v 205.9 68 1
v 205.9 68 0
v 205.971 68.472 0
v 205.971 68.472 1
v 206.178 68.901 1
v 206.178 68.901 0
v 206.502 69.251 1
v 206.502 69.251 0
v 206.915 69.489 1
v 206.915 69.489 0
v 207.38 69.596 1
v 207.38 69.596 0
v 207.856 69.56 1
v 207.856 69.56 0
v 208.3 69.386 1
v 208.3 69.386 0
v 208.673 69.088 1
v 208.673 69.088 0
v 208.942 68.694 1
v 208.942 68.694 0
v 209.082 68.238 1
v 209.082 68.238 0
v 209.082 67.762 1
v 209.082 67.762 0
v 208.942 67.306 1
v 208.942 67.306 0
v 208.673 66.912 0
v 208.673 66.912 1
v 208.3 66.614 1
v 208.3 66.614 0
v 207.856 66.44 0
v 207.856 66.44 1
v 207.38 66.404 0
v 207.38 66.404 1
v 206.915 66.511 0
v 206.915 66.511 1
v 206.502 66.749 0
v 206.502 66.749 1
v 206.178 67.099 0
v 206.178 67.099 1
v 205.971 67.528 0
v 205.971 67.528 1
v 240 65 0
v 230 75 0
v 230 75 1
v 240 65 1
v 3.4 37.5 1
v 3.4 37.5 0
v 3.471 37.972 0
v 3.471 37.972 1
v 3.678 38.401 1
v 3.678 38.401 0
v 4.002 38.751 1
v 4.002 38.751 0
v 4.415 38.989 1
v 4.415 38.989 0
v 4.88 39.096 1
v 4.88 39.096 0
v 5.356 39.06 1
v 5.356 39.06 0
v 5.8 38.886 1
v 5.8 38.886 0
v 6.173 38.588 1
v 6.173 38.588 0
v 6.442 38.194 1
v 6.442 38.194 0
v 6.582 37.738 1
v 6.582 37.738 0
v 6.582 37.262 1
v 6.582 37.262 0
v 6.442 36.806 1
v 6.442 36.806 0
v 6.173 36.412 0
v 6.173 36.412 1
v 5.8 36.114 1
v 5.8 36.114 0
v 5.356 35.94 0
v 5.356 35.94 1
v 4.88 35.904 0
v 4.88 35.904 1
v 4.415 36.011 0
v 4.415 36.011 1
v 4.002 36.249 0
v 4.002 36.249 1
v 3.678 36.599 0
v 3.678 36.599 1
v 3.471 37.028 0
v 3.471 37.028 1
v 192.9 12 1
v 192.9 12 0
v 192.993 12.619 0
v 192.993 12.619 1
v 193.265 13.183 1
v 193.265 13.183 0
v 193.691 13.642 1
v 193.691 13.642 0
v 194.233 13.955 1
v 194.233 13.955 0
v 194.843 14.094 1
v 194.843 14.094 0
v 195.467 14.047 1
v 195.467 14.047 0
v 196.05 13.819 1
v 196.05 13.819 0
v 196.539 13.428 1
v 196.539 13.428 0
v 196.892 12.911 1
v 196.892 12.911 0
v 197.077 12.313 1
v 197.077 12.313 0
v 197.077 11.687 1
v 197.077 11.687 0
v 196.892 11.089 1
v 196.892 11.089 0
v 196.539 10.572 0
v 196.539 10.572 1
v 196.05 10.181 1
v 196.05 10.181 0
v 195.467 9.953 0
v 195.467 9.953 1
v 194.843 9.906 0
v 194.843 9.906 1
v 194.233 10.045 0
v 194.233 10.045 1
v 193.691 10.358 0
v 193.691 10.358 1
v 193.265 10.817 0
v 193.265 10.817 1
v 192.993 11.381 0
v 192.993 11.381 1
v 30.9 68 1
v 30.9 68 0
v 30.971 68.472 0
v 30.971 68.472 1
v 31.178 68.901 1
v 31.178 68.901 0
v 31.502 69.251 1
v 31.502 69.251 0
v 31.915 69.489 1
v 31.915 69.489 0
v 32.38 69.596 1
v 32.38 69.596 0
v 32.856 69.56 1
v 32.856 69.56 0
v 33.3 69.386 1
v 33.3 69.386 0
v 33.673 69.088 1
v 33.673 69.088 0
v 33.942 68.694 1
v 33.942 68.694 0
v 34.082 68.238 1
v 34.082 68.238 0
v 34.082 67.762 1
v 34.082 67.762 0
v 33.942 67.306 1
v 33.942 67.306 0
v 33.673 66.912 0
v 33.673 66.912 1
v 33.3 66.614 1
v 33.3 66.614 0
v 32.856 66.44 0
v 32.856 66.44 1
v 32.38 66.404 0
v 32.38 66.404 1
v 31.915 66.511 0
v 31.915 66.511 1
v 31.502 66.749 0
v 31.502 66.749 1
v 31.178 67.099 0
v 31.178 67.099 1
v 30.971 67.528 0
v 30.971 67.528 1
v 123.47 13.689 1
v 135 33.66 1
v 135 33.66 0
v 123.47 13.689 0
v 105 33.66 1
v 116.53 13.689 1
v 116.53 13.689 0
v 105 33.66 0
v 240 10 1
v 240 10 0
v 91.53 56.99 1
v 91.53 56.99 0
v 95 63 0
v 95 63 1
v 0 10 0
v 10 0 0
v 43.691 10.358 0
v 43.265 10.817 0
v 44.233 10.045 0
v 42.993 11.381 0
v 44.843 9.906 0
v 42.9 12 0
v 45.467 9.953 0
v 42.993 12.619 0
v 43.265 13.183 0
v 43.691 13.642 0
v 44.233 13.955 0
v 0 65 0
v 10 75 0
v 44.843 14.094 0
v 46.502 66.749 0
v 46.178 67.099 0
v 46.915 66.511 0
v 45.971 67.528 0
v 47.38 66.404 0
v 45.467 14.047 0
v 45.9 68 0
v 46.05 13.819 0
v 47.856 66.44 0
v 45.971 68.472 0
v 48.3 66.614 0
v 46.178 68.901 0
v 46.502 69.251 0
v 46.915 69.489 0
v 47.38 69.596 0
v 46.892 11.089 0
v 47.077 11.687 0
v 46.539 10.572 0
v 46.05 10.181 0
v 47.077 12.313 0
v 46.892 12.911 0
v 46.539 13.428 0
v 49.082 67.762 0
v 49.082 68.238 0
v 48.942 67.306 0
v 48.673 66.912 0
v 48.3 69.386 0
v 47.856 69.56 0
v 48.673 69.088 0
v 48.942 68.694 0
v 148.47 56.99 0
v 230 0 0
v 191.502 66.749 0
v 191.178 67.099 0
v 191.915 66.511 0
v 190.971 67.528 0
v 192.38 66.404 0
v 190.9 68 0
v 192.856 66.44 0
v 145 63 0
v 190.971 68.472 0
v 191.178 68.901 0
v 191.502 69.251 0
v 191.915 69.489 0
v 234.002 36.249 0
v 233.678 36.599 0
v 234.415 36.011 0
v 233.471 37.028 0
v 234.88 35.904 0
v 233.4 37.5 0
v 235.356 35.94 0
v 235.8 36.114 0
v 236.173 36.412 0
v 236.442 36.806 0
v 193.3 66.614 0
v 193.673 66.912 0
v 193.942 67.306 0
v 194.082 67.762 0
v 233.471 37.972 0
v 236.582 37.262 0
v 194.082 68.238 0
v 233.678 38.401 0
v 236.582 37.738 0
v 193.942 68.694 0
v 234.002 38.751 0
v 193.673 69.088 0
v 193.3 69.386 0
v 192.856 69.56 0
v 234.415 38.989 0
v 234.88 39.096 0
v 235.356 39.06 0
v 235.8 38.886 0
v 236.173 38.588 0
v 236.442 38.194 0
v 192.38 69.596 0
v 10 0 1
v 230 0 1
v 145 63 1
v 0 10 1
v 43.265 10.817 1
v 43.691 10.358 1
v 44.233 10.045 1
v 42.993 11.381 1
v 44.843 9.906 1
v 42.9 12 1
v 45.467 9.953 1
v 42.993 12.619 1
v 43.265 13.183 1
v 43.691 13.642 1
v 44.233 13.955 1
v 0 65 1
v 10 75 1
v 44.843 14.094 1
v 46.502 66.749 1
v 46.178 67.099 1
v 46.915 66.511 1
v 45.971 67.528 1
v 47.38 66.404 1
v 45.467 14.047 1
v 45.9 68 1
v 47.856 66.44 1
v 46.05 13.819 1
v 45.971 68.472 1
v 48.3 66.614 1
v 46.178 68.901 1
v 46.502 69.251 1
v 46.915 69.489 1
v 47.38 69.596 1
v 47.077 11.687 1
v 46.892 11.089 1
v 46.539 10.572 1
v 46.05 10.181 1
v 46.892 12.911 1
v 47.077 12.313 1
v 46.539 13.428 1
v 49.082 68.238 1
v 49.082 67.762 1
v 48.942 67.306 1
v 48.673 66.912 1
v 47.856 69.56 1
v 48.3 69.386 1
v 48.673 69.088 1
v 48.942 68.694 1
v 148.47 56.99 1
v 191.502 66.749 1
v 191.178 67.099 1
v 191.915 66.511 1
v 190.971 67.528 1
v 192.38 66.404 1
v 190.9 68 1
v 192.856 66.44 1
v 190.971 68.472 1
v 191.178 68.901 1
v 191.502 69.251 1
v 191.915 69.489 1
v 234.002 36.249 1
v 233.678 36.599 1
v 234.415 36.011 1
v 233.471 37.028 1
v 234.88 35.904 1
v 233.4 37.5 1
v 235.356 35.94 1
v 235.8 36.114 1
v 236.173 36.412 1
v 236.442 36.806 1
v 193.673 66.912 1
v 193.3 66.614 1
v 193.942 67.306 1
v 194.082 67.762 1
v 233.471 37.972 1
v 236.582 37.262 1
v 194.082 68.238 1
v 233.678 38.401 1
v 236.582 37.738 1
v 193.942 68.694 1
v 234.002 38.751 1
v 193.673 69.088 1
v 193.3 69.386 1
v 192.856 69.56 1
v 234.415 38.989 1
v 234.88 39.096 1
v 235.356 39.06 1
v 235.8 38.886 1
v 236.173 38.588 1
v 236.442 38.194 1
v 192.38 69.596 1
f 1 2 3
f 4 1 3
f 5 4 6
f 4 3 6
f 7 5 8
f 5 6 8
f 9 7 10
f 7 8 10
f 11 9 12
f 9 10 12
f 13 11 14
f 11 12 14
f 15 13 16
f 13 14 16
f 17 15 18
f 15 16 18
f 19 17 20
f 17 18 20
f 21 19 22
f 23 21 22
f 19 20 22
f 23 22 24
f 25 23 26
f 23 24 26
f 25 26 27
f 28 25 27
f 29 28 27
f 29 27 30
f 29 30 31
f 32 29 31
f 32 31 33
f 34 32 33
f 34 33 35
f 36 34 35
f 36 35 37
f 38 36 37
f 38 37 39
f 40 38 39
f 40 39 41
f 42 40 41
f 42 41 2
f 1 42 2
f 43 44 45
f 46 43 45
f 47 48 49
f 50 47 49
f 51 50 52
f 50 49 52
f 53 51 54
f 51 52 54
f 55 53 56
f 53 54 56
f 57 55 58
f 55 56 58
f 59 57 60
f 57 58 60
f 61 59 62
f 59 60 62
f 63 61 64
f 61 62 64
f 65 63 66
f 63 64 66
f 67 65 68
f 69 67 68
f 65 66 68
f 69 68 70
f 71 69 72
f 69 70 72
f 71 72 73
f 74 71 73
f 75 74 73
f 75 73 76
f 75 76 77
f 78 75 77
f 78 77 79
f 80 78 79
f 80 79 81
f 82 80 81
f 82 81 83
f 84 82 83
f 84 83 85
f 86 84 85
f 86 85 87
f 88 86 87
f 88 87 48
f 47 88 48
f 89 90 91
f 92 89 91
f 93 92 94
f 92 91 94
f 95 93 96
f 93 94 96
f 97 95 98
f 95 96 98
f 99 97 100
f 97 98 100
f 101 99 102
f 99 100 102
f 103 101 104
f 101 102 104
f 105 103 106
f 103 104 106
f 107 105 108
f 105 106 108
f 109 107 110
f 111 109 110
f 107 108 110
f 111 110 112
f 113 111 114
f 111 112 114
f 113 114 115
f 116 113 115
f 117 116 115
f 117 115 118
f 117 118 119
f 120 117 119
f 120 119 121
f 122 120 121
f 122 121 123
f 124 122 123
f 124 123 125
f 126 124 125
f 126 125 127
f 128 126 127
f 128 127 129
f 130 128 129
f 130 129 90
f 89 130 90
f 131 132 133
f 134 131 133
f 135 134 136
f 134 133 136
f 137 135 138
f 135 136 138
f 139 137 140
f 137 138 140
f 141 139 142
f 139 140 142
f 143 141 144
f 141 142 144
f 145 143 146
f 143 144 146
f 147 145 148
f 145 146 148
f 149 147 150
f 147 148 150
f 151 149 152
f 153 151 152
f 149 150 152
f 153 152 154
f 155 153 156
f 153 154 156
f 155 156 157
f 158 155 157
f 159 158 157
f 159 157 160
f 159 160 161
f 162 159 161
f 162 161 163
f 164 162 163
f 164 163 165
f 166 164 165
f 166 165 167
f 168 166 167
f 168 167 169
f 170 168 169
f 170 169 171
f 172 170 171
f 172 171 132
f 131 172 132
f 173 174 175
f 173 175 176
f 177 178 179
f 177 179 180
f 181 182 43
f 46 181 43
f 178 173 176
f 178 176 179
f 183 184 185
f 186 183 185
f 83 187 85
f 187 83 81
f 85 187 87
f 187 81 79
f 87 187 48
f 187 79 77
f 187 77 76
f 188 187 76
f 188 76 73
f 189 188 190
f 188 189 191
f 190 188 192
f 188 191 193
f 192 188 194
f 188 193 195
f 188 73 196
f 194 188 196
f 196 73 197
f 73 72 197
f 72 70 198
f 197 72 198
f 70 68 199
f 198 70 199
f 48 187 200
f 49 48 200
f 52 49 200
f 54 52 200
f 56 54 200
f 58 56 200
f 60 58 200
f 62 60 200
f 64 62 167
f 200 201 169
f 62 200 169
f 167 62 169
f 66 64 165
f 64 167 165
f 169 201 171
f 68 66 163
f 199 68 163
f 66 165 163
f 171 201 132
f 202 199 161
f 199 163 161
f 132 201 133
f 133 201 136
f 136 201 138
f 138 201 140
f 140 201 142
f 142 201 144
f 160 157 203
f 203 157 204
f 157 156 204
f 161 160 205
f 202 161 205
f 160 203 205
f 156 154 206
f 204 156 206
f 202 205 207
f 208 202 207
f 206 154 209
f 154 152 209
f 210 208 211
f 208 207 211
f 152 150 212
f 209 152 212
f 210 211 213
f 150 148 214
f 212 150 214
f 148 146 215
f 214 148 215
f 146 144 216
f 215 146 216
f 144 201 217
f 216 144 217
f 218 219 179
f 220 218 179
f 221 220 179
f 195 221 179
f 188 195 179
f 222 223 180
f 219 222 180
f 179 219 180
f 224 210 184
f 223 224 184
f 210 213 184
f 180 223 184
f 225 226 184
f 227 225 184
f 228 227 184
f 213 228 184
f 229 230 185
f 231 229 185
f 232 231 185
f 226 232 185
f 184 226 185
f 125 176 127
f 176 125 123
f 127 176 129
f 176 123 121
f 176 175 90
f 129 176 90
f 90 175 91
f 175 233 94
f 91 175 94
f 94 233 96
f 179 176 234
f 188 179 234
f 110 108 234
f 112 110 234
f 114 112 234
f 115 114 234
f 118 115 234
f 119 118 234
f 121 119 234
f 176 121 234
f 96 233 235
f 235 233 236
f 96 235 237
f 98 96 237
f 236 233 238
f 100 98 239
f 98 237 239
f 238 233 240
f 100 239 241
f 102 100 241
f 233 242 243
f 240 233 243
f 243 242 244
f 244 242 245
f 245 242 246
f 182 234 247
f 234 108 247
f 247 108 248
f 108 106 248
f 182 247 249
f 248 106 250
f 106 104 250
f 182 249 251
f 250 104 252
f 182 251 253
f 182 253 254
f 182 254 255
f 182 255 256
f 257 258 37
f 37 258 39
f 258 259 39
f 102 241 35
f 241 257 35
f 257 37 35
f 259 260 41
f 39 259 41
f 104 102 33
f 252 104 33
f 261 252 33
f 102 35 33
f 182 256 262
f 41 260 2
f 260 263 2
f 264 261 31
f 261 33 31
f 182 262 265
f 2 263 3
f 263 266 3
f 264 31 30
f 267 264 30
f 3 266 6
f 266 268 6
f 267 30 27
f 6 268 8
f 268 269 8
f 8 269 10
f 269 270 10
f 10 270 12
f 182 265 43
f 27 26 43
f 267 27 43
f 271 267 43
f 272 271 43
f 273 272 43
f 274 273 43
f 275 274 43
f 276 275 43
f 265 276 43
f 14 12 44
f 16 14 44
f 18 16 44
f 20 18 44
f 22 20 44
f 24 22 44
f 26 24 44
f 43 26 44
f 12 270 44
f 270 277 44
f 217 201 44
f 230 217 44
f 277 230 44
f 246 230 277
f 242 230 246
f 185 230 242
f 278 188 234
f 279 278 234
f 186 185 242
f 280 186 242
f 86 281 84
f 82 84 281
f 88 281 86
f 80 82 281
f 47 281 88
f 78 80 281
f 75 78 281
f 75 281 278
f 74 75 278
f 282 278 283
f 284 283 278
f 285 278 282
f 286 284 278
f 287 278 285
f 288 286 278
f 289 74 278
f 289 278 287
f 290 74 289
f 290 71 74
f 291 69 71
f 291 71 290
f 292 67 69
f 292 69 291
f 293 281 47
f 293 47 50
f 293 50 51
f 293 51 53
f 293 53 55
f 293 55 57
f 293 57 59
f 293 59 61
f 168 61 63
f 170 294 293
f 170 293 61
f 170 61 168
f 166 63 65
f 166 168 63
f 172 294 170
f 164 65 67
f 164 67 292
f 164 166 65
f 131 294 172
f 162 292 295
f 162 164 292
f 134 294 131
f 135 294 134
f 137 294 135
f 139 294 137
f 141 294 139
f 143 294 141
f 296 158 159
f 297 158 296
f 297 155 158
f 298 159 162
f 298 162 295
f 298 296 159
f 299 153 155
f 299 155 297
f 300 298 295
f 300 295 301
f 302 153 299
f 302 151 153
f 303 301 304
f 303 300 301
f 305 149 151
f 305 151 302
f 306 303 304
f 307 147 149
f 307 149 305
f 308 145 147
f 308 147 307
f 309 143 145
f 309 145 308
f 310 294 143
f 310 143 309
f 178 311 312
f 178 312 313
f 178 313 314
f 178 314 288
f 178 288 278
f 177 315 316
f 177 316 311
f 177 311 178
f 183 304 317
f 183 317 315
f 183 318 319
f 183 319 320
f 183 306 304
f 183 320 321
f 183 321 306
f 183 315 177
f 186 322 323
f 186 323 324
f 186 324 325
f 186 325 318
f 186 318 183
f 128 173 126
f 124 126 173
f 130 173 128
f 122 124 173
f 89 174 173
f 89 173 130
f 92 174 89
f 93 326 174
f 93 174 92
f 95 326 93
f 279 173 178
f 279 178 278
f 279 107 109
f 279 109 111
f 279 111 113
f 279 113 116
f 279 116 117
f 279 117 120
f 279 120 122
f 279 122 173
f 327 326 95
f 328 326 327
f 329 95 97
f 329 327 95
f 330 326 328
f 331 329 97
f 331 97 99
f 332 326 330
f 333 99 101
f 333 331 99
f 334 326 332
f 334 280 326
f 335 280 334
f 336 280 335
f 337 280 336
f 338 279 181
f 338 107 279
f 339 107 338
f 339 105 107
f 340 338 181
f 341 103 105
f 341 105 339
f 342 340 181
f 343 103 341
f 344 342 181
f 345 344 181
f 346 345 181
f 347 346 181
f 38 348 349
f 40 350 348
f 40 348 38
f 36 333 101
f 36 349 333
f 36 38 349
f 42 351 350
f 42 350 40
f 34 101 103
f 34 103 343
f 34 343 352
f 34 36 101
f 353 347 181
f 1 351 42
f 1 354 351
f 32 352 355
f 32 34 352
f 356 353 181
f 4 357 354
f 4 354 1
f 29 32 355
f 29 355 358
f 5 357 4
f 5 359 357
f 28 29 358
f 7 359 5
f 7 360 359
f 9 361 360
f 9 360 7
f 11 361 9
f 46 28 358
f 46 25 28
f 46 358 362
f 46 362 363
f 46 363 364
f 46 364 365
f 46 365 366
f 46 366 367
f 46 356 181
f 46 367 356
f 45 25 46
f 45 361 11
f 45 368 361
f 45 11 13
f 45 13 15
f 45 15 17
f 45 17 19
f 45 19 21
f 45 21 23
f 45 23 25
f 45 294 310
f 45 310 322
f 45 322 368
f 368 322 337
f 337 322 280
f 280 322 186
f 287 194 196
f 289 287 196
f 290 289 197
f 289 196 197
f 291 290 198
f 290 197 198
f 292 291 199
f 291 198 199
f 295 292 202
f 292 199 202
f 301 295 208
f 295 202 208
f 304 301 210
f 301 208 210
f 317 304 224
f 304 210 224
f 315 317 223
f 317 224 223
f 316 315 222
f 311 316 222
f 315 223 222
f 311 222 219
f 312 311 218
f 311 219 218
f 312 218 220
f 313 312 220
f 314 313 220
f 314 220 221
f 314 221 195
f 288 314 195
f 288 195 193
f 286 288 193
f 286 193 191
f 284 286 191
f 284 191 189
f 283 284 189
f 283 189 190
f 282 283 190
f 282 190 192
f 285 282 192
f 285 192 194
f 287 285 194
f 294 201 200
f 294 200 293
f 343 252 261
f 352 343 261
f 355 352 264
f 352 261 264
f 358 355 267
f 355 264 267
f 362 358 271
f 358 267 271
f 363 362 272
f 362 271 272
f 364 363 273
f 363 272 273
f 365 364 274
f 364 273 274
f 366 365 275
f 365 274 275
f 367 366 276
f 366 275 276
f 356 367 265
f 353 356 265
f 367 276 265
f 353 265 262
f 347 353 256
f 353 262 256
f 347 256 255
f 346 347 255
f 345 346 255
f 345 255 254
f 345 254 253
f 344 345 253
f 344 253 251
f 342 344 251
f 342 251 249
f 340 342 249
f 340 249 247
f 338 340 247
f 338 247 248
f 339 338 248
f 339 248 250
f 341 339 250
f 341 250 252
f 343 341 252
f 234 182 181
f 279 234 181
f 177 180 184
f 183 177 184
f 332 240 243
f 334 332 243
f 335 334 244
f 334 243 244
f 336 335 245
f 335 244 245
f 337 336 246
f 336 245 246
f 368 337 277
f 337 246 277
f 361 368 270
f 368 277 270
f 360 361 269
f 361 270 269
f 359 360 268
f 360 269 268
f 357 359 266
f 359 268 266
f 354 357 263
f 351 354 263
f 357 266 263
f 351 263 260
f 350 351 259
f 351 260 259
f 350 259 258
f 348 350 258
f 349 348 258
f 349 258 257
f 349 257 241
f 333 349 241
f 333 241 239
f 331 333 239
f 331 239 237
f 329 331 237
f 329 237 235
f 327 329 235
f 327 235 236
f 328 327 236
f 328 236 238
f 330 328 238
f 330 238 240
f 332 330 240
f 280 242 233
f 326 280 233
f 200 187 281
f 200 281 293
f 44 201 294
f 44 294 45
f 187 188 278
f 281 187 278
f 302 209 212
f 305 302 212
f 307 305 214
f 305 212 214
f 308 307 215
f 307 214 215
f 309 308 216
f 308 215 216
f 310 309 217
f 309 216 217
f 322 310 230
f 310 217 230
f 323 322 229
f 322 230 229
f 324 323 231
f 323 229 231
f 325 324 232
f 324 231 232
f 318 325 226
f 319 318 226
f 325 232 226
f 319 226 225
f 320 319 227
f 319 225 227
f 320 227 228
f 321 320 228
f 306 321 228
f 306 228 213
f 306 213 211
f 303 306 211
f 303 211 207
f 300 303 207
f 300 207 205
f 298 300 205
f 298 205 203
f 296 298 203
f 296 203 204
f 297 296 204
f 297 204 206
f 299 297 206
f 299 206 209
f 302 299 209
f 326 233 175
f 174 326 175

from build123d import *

# Parameters (mm, degrees)
SKETCH_1_W          = 240
SKETCH_1_H          = 75
EXTRUDE_1_DEPTH     = 1
CHAMFER_1_SIZE      = 10
CUT_EXTRUDE_2_DEPTH = 10
SKETCH_4_R          = 2.1
SKETCH_4_R_2        = 1.6
CUT_EXTRUDE_3_DEPTH = 10
EXTRUDE_2_DEPTH     = 1


with BuildPart() as part:
    # 草图1 → 凸台-拉伸1 (new body)
    with BuildSketch(Plane.XY):
        with Locations((120, 37.5)):
            Rectangle(SKETCH_1_W, SKETCH_1_H)
    extrude(amount=EXTRUDE_1_DEPTH)

    # 倒角1
    chamfer_1_edges = [part.edges().sort_by_distance(p)[0] for p in [
        (0, 75, 0.5),
        (240, 75, 0.5),
        (240, 0, 0.5),
        (0, 0, 0.5),
    ]]
    chamfer(chamfer_1_edges, length=CHAMFER_1_SIZE)

    # 草图3 → 切除-拉伸2 (cut)
    with BuildSketch(Plane(origin=(0, 0, 0), x_dir=(-1, 0, 0), z_dir=(0, 0, -1))):
        Polygon((-148.469655115, 56.990381057), (-135, 33.660254038), (-130, 42.320508076), (-110, 42.320508076), (-105, 33.660254038), (-91.530344885, 56.990381057), (-95, 63), (-145, 63), align=None)
        Polygon((-130, 7.679491924), (-110, 7.679491924), (-100, 25), (-110, 42.320508076), (-130, 42.320508076), (-140, 25), align=None)
    extrude(amount=-CUT_EXTRUDE_2_DEPTH, mode=Mode.SUBTRACT)

    # 草图4 → 切除-拉伸3 (cut)
    with BuildSketch(Plane(origin=(0, 0, 0), x_dir=(-1, 0, 0), z_dir=(0, 0, -1))):
        with Locations((-195, 12)):
            Circle(SKETCH_4_R)
        with Locations((-45, 12)):
            Circle(SKETCH_4_R)
        with Locations((-207.5, 68)):
            Circle(SKETCH_4_R_2)
        with Locations((-192.5, 68)):
            Circle(SKETCH_4_R_2)
        with Locations((-47.5, 68)):
            Circle(SKETCH_4_R_2)
        with Locations((-32.5, 68)):
            Circle(SKETCH_4_R_2)
        with Locations((-235, 37.5)):
            Circle(SKETCH_4_R_2)
        with Locations((-5, 37.5)):
            Circle(SKETCH_4_R_2)
    extrude(amount=-CUT_EXTRUDE_3_DEPTH, mode=Mode.SUBTRACT)

    # 草图5 → 凸台-拉伸2 (add)
    with BuildSketch(Plane.XY.offset(1)):
        Polygon((135, 33.660254038), (123.469655115, 13.689110868), (116.530344885, 13.689110868), (105, 33.660254038), (100, 25), (110, 7.679491924), (130, 7.679491924), (140, 25), align=None)
    extrude(amount=-EXTRUDE_2_DEPTH)


solid = part.part
